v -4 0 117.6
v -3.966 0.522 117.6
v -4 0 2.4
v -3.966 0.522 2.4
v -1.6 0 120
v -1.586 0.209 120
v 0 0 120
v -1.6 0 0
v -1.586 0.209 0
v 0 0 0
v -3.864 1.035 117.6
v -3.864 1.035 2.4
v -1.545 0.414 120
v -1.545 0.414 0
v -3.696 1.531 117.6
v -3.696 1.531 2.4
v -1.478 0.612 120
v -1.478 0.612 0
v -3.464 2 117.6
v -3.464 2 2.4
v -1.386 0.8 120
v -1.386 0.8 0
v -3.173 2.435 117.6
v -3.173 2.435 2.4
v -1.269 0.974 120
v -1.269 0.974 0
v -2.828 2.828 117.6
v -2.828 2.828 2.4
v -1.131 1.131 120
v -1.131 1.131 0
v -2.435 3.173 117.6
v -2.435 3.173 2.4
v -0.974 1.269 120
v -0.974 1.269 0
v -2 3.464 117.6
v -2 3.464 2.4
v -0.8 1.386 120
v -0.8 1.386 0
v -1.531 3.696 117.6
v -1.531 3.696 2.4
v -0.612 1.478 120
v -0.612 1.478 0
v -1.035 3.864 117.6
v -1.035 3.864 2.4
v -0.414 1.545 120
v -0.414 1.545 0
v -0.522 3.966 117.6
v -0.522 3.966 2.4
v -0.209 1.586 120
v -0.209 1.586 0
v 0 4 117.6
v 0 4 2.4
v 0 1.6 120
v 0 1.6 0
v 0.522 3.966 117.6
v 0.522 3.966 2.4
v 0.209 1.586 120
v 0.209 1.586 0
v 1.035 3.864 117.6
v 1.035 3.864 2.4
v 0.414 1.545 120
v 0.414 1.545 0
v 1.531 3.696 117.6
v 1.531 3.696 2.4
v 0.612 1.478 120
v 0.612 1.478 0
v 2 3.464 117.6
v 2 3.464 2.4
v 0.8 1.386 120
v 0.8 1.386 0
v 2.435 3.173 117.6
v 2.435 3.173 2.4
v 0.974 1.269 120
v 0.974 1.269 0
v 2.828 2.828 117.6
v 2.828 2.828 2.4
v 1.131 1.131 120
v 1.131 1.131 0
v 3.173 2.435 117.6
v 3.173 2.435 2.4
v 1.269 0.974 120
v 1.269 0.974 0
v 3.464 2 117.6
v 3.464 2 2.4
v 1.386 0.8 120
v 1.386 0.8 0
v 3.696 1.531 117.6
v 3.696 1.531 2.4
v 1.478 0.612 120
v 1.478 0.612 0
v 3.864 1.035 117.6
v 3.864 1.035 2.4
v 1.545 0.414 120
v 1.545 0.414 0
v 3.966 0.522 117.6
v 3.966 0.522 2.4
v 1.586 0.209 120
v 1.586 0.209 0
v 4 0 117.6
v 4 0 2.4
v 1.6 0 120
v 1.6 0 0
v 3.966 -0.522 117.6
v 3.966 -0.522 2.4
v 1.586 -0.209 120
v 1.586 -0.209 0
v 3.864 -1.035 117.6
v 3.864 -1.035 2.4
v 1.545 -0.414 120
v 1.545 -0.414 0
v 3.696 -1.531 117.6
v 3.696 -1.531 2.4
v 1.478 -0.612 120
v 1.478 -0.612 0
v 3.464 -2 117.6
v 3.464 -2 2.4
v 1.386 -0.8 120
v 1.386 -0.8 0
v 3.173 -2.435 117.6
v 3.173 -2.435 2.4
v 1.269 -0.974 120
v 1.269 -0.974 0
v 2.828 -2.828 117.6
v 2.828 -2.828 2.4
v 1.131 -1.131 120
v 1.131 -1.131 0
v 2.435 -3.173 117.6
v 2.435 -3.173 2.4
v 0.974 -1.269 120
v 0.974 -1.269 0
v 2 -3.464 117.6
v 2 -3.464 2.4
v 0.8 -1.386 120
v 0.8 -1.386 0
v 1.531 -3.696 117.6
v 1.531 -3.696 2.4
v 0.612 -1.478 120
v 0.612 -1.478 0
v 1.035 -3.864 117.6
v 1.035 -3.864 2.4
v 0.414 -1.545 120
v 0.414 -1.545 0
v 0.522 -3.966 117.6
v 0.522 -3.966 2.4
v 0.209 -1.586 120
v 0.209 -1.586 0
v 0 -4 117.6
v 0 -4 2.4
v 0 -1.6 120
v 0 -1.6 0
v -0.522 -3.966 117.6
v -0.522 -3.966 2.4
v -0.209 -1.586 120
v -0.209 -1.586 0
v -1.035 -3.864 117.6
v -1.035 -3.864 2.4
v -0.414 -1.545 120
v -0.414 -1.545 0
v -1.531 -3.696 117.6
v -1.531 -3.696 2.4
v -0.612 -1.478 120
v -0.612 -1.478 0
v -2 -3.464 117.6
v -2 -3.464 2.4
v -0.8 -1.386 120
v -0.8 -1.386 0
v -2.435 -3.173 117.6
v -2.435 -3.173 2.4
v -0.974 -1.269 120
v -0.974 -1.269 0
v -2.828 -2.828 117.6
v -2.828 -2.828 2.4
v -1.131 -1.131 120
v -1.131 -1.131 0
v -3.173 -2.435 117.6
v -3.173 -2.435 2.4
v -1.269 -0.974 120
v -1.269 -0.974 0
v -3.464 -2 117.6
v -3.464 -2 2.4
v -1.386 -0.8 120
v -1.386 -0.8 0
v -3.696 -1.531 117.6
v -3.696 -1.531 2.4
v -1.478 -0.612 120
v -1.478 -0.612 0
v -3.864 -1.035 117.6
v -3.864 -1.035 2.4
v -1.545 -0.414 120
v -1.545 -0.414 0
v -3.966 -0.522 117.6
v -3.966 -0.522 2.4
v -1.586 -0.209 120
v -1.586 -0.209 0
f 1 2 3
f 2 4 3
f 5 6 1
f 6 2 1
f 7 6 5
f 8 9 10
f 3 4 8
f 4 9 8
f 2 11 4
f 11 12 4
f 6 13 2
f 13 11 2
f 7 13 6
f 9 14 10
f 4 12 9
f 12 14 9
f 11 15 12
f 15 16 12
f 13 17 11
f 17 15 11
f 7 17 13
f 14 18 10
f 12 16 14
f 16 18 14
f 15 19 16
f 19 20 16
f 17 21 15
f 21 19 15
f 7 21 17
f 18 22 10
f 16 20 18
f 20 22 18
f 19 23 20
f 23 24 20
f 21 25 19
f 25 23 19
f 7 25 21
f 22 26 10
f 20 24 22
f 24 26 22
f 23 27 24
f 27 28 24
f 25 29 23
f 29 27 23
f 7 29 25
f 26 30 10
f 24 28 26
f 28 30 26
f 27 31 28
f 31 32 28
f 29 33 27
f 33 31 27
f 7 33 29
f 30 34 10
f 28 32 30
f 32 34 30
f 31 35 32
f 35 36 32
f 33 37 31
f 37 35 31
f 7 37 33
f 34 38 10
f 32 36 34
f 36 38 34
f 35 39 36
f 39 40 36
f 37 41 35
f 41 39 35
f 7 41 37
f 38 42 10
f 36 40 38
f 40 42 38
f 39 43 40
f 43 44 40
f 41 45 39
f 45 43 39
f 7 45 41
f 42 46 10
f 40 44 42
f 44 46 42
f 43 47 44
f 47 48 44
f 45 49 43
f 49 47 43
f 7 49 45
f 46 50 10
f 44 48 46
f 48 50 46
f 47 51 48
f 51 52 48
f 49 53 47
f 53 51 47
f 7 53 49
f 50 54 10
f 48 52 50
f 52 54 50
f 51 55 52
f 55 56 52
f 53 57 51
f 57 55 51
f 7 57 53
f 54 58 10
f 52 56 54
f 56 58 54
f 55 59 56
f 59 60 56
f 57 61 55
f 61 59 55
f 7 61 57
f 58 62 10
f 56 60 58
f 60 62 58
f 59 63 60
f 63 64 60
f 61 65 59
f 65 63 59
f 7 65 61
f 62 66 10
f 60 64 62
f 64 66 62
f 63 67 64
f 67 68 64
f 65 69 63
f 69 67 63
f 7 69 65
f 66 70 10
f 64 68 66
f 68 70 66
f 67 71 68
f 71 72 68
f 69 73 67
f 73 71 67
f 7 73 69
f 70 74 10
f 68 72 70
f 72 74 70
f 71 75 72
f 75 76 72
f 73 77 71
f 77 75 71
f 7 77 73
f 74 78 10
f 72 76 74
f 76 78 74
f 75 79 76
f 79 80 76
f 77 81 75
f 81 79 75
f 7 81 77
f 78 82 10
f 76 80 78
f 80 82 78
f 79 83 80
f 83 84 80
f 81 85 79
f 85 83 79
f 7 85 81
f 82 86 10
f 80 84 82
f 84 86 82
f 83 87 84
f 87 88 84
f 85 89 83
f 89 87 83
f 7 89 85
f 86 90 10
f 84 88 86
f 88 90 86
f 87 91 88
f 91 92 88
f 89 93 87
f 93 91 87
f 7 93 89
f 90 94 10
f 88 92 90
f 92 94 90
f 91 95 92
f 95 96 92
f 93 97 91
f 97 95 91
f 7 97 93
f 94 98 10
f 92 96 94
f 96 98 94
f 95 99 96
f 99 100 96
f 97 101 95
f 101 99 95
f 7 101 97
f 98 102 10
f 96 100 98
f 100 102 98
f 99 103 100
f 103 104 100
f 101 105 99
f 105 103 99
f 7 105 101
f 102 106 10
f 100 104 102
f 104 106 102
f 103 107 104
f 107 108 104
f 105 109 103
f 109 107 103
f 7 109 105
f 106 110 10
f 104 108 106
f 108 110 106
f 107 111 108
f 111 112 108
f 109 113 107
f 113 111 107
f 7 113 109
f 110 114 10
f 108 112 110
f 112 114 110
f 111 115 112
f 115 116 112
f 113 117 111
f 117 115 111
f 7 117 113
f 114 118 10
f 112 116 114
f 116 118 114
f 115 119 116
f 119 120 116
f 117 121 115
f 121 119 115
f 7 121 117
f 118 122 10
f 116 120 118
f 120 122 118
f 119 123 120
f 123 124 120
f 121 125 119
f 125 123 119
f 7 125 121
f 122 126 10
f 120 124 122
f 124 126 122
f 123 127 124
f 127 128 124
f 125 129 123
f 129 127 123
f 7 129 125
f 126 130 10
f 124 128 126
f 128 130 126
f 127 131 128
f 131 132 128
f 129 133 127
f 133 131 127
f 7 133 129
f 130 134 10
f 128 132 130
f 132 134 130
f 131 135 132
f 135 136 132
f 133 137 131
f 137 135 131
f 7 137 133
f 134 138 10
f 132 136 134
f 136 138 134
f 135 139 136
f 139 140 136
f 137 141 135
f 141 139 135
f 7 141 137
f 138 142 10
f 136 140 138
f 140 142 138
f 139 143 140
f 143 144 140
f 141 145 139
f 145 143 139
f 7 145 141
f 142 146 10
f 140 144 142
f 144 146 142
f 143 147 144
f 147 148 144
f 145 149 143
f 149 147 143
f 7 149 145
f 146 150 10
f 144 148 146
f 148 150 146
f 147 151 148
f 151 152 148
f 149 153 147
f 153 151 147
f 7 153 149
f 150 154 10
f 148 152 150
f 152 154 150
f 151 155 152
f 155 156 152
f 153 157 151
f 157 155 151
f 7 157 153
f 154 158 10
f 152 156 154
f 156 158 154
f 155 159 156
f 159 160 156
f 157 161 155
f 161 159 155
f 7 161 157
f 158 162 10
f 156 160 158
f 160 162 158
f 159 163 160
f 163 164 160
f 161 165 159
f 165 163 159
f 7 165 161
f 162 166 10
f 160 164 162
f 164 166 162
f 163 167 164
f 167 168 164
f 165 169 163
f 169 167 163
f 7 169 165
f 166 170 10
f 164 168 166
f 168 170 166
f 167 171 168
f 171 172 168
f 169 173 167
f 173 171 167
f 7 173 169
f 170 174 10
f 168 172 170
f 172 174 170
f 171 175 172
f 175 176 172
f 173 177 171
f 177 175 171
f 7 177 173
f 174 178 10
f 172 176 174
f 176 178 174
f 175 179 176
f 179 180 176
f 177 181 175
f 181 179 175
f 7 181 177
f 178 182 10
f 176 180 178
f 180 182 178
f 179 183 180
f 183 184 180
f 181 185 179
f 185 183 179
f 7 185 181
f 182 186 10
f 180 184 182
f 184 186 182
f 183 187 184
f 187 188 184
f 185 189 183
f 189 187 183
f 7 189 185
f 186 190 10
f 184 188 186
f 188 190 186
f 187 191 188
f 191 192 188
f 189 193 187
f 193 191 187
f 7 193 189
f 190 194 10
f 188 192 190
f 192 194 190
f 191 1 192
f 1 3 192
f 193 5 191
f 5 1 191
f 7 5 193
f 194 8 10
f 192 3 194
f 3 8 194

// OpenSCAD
// file: ../config.scad
// SCARA 로봇 공통 사양(specification) — 모든 부품 파일에서 include해 사용한다.

$fn = 48;

// ── 공차(tolerance) ──
print_clearance = 0.2;   // FDM 출력 끼워맞춤(fit) 여유 — 압입(press-fit) 자리 제외
eps             = 1/128; // 미세 겹침(epsilon) — 접하는 솔리드를 살짝 겹쳐 동일면(coincident face) z-파이팅 방지

// ── FDM 출력 사양(print specification) ──
fdm_layer_h       = 0.28;   // 레이어 높이(layer height) — 슬라이서(slicer) 설정값과 일치시킨다.
fdm_shoulder_layers = 6;   // 숄더(shoulder) 최소 레이어 수 — FDM 최소 구조 벽(0.4mm 노즐 3겹 ~1.2mm) 기준 하한값.

// ── 레이아웃(layout) ──
// layout_margin — 플레이트 위 부품 배치 공통 여백(margin). 부품 외곽선에서
// 사방으로 주는 값 → 부품끼리는 2*margin 이격, 외곽 가장자리도 margin 확보.
layout_margin = 4;

// ── 시트 형상(seat geometry) ──
// seat_shoulder_t — fdm_layer_h · fdm_shoulder_layers 파생. 슬라이서 설정 변경 시 자동 연동.
seat_shoulder_t = fdm_layer_h * fdm_shoulder_layers;
// main file
/*
 * guide_rods.scad - 매끈한 선형 가이드 로드(smooth linear guide rod) 기성품(vitamin)
 *
 * LM8 계열 ⌀8 경화강(hardened steel) 직선 봉(linear shaft). 선형 부시
 * (linear bushing)나 LM 베어링이 미끄러지는 마찰면(running surface)을
 * 제공한다. 제네릭 smooth_rod()가 어떤 지름(LM6·LM8·LM10 등)이든 만들고,
 * 변형 guide_rod()가 LM8 리터럴을 넘긴다.
 *
 * Z 브레이크포인트(Z breakpoint) 최적화: 로드는 회전 대칭(rotationally
 * symmetric)이라 [r, z] 윤곽선 하나를 단일 rotate_extrude로 돌려 솔리드를
 * 만든다. 양 끝 모따기(chamfer)는 윤곽선 자체에 포함해 difference·union을
 * 쓰지 않는다.
 *
 * 좌표계: 축(axis) = Z, 봉은 z=0..l.
 */

include <../config.scad>

/* --- 형상 비율(cosmetic) --- */
chamfer_ratio	= 0.6;	/* 끝 모따기(chamfer) 깊이 = 지름 대비 비율 */

/* --- 색상(cosmetic) --- */
c_rod		= [0.55, 0.56, 0.59];	/* 경화강(hardened steel) 연마면 */

/*
 * 매끈한 로드(제네릭) — 지름(d) x 길이(l). 양 끝은 부시(bushing) 삽입을
 * 돕는 도입 모따기(lead-in chamfer)로 둔다. [r, z] 단면을 단일
 * rotate_extrude로 돌린다(중첩 모듈 revolve).
 */
module smooth_rod(d, l)
{
	r	= d / 2;			/* 봉 반지름 */
	ch	= r * chamfer_ratio;		/* 모따기 깊이(축방향) */

	/* Z 브레이크포인트 회전체 — [r, z] 윤곽선을 축으로 폐합해 단일 회전 */
	module revolve(points)
		rotate_extrude(convexity = 2)
			polygon(concat(points,
					[[0, points[len(points) - 1][1]],
					 [0, points[0][1]]]));

	/*
	 * 끝 모따기(chamfer) — 양 끝을 비스듬히 깎아 부시(bushing)·LM
	 * 베어링 삽입 시 모서리 걸림(edge catch)을 막는 도입부로 쓴다.
	 */
	color(c_rod)
		revolve([[r - ch, 0],  [r, ch],
			 [r, l - ch], [r - ch, l]]);
}

/* --- 표준 변형(convenience) --- */
module guide_rod(l) smooth_rod(8, l);	/* LM8 ⌀8 선형 가이드 */

guide_rod(120);
